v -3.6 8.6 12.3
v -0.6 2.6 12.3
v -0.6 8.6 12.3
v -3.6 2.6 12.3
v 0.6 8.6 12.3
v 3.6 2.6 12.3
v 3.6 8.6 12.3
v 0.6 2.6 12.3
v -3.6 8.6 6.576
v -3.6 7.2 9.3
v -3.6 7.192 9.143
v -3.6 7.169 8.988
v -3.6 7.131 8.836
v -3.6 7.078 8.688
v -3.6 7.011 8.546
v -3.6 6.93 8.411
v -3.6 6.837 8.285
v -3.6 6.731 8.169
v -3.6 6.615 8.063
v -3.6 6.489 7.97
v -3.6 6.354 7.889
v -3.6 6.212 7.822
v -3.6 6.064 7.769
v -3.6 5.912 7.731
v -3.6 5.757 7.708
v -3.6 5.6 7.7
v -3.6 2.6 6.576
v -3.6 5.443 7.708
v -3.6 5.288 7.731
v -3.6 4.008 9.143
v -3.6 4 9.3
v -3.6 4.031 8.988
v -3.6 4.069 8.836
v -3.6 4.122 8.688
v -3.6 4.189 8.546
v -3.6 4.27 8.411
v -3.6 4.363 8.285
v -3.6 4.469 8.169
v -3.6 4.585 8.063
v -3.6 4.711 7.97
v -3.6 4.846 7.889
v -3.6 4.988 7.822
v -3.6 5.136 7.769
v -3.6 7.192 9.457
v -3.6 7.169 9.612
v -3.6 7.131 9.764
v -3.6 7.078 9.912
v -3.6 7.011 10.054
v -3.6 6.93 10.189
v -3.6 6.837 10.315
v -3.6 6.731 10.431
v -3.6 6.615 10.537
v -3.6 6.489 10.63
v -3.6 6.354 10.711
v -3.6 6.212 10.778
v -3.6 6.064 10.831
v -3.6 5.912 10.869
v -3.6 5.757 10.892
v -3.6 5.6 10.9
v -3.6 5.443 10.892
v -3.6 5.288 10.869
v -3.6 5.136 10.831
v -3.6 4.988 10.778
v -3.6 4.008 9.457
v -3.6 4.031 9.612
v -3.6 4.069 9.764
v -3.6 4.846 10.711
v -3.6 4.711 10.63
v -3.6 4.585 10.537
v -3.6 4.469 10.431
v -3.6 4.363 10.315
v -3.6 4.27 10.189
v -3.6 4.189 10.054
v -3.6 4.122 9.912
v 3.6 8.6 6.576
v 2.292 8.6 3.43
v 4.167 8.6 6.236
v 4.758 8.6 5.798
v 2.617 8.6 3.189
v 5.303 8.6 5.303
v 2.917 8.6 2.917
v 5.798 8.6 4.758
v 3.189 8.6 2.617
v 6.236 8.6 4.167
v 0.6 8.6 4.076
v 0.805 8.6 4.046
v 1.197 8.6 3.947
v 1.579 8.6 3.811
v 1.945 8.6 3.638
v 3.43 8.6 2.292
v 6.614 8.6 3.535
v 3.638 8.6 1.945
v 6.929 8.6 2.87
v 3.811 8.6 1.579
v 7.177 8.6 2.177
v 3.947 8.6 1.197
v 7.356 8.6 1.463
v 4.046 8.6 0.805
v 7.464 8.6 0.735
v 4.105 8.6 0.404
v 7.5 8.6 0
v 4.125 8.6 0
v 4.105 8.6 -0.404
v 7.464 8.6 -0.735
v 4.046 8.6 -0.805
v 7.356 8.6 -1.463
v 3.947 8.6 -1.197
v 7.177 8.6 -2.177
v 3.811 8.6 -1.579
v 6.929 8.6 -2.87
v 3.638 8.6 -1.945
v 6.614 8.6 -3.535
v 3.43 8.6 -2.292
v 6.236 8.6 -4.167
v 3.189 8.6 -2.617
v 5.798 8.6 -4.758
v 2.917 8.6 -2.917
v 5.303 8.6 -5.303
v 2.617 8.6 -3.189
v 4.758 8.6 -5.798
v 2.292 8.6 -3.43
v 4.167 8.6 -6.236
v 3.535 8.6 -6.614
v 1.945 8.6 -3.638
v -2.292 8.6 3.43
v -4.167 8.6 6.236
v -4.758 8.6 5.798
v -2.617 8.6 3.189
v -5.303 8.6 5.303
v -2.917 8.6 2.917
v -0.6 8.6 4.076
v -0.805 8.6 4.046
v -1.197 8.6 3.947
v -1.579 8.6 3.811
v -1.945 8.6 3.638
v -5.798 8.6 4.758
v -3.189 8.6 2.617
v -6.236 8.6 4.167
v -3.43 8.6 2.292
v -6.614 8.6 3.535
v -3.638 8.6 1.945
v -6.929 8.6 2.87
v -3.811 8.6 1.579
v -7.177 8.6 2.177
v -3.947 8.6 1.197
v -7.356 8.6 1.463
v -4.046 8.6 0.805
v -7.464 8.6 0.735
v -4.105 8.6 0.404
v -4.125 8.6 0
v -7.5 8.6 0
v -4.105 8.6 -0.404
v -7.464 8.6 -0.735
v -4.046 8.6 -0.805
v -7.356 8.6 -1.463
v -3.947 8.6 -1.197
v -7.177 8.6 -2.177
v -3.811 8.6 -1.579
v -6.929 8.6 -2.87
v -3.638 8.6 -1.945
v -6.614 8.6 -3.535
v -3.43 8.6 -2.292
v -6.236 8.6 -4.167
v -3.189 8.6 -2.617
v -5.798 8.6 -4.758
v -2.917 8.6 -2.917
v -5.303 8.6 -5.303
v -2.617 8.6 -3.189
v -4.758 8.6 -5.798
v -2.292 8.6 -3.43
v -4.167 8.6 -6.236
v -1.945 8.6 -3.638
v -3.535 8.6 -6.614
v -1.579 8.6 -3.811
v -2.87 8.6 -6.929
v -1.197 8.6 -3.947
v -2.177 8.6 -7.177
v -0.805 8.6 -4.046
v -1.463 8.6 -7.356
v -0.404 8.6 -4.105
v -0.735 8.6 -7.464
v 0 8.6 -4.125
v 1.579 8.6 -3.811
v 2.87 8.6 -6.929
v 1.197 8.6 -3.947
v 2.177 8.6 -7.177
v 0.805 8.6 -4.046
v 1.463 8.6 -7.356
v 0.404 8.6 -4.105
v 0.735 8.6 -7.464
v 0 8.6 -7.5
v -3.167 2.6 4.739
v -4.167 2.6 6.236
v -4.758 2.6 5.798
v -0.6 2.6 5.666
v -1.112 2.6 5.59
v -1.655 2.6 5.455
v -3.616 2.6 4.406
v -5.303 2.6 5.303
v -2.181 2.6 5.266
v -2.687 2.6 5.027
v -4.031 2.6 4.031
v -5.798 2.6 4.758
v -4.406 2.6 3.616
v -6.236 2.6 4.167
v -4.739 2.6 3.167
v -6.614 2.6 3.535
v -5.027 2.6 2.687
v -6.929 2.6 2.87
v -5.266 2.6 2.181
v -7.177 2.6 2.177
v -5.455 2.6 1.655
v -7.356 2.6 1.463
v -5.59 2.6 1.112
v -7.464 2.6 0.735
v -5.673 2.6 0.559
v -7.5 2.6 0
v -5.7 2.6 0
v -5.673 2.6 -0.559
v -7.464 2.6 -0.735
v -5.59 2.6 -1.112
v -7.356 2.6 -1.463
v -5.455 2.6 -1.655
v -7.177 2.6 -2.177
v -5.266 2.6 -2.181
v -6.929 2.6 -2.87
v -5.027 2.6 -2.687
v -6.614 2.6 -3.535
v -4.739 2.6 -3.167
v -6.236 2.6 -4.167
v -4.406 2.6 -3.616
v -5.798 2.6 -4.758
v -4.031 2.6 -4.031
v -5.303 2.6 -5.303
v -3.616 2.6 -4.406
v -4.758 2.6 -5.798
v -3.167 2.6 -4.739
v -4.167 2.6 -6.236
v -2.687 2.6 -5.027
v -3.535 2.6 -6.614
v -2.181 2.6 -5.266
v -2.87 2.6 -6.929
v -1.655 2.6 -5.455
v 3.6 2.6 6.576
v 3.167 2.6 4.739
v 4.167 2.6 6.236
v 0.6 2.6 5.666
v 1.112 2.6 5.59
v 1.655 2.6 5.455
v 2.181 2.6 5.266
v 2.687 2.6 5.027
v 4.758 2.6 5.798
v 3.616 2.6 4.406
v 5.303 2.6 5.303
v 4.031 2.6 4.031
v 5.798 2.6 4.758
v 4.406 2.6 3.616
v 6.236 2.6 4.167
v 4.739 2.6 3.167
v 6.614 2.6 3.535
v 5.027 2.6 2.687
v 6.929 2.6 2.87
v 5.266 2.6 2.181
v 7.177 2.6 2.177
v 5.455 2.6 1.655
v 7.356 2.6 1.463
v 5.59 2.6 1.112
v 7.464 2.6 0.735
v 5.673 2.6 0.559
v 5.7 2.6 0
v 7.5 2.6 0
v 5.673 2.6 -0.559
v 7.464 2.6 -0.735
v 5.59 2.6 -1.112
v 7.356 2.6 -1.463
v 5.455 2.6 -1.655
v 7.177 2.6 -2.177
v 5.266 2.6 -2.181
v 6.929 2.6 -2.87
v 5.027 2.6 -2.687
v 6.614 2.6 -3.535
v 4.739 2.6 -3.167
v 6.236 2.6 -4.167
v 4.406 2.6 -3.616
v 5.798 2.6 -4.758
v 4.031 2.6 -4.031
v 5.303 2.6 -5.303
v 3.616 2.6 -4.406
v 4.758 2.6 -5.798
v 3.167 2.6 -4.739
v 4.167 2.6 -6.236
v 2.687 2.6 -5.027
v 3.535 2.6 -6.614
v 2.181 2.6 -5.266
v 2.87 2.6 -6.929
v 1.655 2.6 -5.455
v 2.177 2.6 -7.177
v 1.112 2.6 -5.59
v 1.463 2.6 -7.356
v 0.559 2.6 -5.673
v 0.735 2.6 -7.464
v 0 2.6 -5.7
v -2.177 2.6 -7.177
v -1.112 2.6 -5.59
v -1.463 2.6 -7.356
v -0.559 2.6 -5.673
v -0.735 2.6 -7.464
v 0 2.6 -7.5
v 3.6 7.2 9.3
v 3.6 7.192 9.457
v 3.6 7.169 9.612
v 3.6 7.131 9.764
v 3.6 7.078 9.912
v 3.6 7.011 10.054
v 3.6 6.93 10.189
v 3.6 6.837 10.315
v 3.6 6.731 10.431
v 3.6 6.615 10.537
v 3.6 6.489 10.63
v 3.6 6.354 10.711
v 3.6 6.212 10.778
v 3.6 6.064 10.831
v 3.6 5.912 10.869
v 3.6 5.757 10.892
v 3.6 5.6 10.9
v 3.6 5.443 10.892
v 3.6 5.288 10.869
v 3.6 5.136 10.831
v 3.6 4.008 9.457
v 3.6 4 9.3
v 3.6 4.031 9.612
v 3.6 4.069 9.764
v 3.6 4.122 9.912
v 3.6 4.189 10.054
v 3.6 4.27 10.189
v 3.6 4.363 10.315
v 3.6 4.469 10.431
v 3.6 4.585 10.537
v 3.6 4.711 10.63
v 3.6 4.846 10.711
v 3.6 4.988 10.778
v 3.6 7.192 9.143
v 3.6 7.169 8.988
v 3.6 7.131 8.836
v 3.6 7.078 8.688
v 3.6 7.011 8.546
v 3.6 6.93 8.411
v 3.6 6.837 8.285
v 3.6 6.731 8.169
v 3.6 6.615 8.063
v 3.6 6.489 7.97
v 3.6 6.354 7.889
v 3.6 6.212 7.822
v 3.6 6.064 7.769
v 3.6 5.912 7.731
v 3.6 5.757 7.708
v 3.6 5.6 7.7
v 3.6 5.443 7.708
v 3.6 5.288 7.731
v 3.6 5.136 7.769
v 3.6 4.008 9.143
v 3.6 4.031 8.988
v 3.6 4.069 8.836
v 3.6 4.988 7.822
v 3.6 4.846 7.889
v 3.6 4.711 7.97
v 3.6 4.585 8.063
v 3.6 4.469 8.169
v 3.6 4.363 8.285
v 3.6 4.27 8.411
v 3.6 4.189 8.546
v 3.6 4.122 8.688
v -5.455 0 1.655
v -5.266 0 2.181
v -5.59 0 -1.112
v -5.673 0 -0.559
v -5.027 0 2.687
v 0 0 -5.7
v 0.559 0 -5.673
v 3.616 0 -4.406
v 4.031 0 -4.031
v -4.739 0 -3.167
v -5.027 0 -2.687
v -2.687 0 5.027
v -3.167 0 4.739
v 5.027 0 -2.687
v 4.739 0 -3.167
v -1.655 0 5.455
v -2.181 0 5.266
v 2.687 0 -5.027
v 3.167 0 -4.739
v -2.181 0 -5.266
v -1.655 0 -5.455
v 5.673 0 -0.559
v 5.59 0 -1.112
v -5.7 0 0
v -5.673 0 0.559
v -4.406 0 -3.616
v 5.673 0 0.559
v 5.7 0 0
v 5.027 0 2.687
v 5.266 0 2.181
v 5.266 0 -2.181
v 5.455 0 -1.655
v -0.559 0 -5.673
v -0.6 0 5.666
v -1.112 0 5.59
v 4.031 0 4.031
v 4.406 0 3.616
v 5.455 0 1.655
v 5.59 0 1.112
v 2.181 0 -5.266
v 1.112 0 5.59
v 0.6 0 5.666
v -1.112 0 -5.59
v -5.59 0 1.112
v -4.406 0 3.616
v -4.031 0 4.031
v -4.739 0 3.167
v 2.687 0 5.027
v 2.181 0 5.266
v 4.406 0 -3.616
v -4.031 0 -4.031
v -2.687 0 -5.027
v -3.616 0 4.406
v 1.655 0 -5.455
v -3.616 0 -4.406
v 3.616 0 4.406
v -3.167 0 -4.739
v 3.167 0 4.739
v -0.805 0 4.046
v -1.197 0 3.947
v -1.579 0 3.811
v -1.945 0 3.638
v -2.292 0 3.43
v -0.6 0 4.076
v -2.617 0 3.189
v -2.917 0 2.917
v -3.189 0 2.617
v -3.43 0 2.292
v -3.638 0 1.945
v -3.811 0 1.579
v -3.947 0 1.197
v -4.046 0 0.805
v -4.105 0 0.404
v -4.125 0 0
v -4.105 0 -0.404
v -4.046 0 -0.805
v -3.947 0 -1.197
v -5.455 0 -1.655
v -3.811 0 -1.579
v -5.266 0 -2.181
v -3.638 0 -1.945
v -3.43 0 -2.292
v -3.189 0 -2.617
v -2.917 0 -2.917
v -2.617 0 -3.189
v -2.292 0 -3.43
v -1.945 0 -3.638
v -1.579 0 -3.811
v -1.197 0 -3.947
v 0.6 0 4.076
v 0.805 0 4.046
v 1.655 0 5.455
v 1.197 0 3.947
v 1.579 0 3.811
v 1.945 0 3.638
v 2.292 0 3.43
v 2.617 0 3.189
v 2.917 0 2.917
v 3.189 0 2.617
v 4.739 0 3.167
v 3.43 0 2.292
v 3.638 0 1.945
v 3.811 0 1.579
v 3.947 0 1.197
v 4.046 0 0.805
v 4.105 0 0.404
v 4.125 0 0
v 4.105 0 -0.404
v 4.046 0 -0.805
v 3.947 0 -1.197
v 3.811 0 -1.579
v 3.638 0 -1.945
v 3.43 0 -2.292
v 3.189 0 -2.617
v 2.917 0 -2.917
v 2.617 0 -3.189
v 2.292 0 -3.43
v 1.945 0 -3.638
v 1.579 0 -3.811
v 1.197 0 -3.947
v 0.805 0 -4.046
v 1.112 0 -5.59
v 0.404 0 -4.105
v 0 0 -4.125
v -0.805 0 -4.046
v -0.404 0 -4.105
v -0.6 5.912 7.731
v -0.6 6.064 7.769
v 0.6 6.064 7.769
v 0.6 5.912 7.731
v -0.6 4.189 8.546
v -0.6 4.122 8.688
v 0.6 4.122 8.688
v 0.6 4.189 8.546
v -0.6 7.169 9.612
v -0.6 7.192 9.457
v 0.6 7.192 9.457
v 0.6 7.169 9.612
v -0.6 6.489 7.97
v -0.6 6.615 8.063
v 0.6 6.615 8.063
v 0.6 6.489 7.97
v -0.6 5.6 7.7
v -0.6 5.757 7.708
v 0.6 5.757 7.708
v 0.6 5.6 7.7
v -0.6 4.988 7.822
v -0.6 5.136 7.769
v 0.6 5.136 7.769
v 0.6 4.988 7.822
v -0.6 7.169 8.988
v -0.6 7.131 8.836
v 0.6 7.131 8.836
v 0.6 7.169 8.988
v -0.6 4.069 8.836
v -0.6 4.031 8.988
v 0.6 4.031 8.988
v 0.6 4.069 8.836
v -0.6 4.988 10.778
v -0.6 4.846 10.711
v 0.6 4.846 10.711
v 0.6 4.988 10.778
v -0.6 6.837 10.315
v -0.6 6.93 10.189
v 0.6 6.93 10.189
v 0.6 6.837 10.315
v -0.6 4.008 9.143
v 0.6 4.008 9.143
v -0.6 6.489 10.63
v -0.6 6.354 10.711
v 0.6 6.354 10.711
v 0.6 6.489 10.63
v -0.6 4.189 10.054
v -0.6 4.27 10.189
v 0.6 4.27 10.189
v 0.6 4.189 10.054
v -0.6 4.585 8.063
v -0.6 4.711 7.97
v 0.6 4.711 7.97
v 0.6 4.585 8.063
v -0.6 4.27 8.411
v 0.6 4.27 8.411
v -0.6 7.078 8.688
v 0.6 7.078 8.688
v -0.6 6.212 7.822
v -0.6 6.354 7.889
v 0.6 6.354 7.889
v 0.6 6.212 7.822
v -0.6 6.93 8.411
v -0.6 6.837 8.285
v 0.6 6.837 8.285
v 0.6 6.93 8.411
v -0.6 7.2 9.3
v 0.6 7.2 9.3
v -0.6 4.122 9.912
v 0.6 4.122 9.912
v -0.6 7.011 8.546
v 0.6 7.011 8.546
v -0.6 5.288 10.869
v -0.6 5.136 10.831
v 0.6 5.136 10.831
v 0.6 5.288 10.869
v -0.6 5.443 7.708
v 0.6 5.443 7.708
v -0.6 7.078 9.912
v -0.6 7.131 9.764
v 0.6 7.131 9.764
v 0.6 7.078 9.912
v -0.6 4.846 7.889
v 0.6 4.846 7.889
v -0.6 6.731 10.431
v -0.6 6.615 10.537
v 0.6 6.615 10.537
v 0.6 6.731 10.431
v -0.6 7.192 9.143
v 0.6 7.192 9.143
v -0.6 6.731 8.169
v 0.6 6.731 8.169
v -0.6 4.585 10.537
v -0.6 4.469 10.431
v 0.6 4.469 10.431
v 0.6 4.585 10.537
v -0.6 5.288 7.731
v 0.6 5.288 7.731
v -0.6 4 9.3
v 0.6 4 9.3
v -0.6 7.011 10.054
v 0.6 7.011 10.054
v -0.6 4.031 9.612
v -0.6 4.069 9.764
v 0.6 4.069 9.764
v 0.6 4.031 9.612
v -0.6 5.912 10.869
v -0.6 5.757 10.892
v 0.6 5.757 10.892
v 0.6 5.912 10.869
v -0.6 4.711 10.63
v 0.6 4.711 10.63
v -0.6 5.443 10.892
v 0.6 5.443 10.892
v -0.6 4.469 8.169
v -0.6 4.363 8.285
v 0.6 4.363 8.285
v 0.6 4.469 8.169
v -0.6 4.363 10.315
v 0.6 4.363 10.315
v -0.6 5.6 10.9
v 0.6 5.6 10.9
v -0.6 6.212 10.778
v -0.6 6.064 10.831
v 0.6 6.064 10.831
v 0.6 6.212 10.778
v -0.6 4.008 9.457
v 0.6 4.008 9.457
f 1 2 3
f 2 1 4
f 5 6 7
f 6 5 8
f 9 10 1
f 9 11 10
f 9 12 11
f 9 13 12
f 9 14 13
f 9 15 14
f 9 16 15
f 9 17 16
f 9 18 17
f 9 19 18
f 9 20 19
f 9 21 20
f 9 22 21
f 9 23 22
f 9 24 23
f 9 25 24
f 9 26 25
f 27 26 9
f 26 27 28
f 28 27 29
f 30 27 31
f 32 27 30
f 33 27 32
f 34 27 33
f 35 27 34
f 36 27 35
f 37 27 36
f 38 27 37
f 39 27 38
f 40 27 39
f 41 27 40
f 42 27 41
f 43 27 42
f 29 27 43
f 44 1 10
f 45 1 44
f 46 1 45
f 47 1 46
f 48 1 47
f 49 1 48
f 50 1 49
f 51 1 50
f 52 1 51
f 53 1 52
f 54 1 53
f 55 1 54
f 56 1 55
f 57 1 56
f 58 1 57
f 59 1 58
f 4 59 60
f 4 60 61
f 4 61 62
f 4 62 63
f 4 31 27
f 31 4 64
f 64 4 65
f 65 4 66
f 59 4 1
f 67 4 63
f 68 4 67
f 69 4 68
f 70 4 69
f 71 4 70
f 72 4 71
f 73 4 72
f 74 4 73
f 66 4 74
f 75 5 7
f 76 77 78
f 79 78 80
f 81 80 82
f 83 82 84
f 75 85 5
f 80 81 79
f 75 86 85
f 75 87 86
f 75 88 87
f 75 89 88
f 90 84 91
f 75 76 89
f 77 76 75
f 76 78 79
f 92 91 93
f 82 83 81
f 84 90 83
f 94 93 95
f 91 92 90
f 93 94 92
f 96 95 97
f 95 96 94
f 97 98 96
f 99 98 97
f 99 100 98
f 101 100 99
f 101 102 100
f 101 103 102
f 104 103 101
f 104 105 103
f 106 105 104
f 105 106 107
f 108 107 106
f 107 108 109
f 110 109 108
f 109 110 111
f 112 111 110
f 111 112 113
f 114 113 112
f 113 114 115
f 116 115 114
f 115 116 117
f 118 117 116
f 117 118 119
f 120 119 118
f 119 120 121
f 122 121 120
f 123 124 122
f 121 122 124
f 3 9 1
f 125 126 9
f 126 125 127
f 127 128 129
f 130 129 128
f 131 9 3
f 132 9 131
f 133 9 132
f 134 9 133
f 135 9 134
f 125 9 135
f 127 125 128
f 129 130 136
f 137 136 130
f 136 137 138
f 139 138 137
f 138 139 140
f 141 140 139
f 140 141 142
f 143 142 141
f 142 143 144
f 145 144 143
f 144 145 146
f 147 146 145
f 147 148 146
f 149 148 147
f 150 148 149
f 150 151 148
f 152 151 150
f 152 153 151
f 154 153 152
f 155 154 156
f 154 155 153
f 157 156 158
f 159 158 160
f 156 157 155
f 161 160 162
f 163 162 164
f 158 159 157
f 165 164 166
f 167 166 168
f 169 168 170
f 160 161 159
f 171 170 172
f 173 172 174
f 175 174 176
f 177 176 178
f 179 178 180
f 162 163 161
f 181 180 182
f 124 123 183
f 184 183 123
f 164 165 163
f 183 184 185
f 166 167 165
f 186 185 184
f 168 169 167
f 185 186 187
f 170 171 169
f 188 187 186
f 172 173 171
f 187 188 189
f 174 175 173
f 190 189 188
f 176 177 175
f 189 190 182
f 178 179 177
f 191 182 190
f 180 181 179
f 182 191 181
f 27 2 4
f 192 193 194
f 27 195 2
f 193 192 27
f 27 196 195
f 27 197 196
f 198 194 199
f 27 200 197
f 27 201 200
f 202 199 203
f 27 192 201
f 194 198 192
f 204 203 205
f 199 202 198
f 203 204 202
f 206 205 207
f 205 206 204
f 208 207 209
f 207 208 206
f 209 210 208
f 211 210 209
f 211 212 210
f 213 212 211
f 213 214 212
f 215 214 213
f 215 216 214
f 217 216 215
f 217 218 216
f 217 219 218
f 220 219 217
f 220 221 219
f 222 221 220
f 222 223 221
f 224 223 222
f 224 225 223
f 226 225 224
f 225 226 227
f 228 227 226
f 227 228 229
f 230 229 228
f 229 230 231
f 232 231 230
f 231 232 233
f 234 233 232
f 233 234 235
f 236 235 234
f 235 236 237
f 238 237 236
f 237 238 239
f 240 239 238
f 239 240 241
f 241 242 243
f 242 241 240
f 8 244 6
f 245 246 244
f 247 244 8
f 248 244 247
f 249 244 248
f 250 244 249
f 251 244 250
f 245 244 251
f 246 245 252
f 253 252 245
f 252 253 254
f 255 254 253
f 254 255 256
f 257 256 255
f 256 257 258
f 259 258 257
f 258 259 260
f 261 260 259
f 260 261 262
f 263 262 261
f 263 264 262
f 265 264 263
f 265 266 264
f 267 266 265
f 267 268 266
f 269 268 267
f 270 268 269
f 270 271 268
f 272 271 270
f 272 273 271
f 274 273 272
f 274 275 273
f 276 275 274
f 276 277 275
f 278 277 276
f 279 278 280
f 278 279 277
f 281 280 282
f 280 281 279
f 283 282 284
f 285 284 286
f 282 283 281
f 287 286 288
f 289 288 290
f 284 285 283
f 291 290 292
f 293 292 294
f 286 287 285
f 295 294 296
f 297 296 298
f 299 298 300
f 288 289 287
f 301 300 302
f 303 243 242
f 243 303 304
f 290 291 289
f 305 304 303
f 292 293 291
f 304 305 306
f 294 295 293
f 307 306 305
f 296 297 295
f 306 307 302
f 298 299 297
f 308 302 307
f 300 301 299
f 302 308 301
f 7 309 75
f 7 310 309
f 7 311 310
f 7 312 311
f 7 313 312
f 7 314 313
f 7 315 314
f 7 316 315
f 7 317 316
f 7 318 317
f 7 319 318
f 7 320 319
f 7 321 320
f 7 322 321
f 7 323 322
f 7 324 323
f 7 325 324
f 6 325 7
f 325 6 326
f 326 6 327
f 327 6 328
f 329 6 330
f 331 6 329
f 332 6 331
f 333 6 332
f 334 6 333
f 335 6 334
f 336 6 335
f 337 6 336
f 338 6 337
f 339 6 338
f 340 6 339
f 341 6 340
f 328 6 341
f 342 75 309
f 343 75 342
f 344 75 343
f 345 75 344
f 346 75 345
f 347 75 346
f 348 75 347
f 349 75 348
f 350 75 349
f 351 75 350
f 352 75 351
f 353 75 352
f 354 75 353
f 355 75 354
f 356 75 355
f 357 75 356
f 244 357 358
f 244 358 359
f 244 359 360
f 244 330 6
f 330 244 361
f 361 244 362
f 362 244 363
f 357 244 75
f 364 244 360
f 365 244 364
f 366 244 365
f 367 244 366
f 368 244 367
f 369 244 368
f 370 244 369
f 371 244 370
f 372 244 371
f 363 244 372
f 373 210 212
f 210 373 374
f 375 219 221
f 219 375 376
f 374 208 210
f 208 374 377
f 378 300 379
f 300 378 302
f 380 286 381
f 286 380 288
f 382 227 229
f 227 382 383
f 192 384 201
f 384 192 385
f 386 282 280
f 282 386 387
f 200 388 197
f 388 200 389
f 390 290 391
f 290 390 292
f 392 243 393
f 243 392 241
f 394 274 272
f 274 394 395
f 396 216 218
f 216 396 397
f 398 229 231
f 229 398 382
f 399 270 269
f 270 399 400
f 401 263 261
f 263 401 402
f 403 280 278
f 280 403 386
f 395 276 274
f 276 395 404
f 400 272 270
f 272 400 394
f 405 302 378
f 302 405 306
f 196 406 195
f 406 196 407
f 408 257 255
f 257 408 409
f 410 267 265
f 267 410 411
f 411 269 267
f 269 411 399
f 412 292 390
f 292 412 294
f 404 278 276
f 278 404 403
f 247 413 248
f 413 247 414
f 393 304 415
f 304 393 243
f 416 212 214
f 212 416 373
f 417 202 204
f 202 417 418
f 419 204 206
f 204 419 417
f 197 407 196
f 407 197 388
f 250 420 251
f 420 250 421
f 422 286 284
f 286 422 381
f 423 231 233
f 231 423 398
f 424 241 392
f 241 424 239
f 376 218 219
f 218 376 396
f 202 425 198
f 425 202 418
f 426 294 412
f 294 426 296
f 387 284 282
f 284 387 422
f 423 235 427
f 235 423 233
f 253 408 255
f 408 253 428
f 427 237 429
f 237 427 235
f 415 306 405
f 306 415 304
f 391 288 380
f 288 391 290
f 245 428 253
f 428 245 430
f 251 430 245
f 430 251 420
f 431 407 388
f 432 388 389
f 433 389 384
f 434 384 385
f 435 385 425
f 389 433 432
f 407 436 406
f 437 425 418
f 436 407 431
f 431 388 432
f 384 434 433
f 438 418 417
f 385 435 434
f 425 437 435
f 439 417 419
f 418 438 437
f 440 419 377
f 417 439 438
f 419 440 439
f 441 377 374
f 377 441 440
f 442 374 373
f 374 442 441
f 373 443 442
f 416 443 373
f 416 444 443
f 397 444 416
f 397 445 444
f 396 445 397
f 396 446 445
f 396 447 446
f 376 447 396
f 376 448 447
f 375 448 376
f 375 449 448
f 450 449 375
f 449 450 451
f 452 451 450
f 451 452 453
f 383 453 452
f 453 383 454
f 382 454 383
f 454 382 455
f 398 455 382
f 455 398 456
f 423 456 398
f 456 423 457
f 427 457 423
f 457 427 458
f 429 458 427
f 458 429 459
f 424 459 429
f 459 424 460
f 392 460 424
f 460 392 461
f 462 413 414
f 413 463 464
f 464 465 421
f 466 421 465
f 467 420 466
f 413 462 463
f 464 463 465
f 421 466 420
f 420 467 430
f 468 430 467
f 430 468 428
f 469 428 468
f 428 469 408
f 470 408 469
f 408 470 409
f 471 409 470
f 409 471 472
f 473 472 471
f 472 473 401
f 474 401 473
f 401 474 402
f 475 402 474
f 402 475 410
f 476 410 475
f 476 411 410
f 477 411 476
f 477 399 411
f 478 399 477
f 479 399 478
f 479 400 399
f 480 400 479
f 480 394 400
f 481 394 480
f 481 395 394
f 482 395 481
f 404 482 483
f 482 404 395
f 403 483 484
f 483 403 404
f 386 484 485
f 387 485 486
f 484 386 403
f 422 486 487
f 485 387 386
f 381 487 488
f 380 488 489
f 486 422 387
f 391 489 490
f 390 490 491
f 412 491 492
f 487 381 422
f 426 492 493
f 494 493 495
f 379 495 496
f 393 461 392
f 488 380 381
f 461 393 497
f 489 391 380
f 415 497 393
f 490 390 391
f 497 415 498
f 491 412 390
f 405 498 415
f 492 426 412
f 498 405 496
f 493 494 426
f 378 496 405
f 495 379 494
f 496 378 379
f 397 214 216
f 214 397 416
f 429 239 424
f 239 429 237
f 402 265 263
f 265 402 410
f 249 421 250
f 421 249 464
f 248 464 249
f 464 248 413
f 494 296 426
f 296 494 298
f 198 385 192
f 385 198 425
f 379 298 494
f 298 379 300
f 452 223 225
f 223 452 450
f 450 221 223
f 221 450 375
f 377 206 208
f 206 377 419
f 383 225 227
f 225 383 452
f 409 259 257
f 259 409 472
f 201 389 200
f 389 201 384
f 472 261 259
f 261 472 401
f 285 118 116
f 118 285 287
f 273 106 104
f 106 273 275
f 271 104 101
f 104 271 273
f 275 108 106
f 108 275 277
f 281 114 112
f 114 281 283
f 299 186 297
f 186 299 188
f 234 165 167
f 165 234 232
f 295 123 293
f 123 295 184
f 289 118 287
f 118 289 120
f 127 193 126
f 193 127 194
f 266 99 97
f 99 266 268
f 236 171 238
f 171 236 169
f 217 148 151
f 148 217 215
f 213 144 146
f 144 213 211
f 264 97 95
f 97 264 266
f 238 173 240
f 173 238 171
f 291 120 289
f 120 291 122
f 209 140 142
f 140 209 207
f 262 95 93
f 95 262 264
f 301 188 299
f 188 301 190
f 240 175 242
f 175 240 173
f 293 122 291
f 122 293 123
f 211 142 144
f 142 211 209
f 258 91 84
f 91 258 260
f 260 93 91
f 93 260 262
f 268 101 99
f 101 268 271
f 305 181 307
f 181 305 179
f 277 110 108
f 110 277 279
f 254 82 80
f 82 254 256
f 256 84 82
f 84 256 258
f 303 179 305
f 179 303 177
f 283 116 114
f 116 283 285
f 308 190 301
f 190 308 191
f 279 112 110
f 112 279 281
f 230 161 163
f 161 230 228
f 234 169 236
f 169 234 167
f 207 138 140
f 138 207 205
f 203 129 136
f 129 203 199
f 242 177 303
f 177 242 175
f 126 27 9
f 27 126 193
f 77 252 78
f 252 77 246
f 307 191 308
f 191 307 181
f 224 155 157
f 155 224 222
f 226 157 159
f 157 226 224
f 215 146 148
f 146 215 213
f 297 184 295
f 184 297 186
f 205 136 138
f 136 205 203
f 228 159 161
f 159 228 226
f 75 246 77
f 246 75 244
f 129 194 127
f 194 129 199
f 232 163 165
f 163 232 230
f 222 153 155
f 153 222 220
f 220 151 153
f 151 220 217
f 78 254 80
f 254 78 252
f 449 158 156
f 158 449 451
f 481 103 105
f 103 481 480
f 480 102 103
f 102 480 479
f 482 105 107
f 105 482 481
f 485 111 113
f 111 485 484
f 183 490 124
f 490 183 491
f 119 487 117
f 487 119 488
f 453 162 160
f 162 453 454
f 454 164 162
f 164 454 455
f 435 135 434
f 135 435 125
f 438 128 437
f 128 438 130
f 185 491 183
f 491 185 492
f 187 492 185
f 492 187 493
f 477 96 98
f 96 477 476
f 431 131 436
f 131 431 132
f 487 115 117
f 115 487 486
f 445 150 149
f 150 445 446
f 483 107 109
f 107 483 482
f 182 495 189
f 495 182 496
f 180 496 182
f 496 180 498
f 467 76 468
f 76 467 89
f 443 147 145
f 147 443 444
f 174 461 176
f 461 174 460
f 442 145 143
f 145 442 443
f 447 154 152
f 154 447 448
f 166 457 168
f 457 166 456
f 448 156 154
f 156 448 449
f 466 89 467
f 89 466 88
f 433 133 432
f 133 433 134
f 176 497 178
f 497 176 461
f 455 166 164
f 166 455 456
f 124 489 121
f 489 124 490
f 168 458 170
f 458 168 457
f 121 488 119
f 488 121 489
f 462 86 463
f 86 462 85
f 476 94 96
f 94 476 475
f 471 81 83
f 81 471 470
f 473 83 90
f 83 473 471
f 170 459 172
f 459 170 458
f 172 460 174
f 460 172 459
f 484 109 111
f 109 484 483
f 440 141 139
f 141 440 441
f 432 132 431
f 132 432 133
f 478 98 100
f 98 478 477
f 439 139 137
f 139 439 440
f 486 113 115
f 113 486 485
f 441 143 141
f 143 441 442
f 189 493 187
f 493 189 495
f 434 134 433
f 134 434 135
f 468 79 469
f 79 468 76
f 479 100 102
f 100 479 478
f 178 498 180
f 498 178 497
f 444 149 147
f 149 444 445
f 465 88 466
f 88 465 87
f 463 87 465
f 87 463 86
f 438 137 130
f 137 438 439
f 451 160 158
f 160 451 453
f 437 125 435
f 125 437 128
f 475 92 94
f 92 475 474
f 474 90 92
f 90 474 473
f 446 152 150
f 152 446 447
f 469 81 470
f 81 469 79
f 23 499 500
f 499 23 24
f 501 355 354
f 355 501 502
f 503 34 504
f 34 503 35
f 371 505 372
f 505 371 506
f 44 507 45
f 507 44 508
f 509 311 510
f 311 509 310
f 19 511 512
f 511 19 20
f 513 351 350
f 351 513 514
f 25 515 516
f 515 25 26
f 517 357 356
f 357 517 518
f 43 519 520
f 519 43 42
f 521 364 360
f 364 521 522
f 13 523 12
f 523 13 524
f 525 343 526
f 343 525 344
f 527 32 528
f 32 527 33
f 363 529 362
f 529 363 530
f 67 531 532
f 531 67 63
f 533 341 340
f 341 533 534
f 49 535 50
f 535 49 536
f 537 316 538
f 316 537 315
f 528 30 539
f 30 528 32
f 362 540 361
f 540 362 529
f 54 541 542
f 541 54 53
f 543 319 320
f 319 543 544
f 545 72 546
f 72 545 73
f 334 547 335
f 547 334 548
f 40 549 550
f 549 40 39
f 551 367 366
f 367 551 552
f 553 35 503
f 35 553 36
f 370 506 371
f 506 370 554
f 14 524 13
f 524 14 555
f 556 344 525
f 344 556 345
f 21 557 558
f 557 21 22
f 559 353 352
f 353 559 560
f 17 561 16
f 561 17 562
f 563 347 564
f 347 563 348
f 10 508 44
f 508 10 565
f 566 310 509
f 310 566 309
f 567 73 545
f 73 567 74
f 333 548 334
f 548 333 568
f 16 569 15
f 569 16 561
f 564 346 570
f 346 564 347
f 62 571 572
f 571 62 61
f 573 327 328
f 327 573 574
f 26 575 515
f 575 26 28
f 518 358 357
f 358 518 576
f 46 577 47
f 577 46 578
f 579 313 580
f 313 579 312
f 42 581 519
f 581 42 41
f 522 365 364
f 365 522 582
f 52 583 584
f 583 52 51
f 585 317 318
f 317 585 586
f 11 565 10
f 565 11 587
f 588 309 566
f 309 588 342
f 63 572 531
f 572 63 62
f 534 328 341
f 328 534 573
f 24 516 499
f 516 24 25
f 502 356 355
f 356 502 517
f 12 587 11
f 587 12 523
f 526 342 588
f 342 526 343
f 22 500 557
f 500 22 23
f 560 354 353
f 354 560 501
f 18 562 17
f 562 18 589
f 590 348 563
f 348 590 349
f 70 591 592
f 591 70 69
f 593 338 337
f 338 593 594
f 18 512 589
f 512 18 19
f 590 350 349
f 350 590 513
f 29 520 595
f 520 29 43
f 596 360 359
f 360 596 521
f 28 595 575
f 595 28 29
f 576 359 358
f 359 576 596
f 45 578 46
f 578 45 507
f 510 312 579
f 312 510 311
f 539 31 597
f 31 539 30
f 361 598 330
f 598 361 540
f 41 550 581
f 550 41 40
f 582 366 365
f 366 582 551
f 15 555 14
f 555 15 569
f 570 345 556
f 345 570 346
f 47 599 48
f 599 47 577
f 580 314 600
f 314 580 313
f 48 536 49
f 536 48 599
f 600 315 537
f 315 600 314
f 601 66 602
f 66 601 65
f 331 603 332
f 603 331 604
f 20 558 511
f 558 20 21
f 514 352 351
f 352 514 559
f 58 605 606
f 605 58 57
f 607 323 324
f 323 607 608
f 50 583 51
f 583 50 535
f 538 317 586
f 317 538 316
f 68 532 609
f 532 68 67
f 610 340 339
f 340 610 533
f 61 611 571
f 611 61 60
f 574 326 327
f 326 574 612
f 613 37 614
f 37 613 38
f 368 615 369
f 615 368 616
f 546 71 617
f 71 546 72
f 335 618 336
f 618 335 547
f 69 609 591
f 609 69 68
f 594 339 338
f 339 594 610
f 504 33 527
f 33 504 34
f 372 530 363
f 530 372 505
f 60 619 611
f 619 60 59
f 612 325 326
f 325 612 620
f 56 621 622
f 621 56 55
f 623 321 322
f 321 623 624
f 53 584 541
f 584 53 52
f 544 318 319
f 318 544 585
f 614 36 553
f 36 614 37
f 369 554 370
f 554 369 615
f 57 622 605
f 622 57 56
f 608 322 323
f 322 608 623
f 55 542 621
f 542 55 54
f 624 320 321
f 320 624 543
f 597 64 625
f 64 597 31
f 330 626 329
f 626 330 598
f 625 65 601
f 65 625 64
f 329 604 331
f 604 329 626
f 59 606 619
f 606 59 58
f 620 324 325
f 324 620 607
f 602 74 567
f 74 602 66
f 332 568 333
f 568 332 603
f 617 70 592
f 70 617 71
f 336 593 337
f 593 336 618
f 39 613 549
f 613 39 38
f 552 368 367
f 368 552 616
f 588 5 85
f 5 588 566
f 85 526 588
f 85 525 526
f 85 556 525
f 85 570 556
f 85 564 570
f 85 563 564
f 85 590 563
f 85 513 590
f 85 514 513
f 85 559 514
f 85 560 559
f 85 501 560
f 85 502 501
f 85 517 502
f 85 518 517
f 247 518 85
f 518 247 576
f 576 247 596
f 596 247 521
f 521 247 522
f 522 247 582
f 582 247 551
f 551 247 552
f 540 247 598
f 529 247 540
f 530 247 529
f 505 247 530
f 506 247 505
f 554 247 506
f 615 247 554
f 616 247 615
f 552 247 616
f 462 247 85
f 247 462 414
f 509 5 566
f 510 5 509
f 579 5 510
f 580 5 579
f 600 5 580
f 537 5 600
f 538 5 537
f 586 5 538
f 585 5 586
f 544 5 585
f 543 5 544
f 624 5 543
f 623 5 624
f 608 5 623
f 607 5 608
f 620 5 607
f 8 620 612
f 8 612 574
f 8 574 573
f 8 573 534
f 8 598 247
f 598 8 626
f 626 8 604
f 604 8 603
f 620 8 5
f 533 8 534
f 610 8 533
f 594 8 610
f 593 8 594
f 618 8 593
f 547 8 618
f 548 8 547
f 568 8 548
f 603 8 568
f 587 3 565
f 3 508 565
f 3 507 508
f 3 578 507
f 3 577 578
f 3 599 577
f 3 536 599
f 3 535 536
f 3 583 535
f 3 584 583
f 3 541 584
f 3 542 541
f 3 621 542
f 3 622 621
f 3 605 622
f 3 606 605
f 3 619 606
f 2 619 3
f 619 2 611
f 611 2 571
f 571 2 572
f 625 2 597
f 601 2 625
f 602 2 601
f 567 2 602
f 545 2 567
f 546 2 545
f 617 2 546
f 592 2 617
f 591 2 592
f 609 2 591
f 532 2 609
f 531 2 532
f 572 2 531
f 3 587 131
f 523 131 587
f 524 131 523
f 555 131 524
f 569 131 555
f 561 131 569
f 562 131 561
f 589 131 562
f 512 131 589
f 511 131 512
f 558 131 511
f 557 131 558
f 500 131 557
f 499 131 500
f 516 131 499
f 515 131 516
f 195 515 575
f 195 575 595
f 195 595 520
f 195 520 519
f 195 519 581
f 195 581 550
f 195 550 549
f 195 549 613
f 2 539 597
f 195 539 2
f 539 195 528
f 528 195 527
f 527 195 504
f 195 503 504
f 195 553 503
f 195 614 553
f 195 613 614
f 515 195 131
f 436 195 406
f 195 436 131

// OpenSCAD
// Standalone v5.2 ankle INNER lock collar - PRINT 2 (one per side).
// Extended-nose collar that clamps the printed socket axle just inboard
// of the 608 inner ring: hub stop | inner ring | this collar = positive
// axial retention both ways (glue optional).
// Clamp bolt: M3 through the split lugs, reachable from the open center
// of the v5.2 carrier. Nose length bridges the housing land so the collar
// body clears the housing inner wall.
// Edit shared dimensions in frame_v5.scad so everything stays linked.

part_mode = "ankle_collar";
print_export = true;

include <frame_v5.scad>
